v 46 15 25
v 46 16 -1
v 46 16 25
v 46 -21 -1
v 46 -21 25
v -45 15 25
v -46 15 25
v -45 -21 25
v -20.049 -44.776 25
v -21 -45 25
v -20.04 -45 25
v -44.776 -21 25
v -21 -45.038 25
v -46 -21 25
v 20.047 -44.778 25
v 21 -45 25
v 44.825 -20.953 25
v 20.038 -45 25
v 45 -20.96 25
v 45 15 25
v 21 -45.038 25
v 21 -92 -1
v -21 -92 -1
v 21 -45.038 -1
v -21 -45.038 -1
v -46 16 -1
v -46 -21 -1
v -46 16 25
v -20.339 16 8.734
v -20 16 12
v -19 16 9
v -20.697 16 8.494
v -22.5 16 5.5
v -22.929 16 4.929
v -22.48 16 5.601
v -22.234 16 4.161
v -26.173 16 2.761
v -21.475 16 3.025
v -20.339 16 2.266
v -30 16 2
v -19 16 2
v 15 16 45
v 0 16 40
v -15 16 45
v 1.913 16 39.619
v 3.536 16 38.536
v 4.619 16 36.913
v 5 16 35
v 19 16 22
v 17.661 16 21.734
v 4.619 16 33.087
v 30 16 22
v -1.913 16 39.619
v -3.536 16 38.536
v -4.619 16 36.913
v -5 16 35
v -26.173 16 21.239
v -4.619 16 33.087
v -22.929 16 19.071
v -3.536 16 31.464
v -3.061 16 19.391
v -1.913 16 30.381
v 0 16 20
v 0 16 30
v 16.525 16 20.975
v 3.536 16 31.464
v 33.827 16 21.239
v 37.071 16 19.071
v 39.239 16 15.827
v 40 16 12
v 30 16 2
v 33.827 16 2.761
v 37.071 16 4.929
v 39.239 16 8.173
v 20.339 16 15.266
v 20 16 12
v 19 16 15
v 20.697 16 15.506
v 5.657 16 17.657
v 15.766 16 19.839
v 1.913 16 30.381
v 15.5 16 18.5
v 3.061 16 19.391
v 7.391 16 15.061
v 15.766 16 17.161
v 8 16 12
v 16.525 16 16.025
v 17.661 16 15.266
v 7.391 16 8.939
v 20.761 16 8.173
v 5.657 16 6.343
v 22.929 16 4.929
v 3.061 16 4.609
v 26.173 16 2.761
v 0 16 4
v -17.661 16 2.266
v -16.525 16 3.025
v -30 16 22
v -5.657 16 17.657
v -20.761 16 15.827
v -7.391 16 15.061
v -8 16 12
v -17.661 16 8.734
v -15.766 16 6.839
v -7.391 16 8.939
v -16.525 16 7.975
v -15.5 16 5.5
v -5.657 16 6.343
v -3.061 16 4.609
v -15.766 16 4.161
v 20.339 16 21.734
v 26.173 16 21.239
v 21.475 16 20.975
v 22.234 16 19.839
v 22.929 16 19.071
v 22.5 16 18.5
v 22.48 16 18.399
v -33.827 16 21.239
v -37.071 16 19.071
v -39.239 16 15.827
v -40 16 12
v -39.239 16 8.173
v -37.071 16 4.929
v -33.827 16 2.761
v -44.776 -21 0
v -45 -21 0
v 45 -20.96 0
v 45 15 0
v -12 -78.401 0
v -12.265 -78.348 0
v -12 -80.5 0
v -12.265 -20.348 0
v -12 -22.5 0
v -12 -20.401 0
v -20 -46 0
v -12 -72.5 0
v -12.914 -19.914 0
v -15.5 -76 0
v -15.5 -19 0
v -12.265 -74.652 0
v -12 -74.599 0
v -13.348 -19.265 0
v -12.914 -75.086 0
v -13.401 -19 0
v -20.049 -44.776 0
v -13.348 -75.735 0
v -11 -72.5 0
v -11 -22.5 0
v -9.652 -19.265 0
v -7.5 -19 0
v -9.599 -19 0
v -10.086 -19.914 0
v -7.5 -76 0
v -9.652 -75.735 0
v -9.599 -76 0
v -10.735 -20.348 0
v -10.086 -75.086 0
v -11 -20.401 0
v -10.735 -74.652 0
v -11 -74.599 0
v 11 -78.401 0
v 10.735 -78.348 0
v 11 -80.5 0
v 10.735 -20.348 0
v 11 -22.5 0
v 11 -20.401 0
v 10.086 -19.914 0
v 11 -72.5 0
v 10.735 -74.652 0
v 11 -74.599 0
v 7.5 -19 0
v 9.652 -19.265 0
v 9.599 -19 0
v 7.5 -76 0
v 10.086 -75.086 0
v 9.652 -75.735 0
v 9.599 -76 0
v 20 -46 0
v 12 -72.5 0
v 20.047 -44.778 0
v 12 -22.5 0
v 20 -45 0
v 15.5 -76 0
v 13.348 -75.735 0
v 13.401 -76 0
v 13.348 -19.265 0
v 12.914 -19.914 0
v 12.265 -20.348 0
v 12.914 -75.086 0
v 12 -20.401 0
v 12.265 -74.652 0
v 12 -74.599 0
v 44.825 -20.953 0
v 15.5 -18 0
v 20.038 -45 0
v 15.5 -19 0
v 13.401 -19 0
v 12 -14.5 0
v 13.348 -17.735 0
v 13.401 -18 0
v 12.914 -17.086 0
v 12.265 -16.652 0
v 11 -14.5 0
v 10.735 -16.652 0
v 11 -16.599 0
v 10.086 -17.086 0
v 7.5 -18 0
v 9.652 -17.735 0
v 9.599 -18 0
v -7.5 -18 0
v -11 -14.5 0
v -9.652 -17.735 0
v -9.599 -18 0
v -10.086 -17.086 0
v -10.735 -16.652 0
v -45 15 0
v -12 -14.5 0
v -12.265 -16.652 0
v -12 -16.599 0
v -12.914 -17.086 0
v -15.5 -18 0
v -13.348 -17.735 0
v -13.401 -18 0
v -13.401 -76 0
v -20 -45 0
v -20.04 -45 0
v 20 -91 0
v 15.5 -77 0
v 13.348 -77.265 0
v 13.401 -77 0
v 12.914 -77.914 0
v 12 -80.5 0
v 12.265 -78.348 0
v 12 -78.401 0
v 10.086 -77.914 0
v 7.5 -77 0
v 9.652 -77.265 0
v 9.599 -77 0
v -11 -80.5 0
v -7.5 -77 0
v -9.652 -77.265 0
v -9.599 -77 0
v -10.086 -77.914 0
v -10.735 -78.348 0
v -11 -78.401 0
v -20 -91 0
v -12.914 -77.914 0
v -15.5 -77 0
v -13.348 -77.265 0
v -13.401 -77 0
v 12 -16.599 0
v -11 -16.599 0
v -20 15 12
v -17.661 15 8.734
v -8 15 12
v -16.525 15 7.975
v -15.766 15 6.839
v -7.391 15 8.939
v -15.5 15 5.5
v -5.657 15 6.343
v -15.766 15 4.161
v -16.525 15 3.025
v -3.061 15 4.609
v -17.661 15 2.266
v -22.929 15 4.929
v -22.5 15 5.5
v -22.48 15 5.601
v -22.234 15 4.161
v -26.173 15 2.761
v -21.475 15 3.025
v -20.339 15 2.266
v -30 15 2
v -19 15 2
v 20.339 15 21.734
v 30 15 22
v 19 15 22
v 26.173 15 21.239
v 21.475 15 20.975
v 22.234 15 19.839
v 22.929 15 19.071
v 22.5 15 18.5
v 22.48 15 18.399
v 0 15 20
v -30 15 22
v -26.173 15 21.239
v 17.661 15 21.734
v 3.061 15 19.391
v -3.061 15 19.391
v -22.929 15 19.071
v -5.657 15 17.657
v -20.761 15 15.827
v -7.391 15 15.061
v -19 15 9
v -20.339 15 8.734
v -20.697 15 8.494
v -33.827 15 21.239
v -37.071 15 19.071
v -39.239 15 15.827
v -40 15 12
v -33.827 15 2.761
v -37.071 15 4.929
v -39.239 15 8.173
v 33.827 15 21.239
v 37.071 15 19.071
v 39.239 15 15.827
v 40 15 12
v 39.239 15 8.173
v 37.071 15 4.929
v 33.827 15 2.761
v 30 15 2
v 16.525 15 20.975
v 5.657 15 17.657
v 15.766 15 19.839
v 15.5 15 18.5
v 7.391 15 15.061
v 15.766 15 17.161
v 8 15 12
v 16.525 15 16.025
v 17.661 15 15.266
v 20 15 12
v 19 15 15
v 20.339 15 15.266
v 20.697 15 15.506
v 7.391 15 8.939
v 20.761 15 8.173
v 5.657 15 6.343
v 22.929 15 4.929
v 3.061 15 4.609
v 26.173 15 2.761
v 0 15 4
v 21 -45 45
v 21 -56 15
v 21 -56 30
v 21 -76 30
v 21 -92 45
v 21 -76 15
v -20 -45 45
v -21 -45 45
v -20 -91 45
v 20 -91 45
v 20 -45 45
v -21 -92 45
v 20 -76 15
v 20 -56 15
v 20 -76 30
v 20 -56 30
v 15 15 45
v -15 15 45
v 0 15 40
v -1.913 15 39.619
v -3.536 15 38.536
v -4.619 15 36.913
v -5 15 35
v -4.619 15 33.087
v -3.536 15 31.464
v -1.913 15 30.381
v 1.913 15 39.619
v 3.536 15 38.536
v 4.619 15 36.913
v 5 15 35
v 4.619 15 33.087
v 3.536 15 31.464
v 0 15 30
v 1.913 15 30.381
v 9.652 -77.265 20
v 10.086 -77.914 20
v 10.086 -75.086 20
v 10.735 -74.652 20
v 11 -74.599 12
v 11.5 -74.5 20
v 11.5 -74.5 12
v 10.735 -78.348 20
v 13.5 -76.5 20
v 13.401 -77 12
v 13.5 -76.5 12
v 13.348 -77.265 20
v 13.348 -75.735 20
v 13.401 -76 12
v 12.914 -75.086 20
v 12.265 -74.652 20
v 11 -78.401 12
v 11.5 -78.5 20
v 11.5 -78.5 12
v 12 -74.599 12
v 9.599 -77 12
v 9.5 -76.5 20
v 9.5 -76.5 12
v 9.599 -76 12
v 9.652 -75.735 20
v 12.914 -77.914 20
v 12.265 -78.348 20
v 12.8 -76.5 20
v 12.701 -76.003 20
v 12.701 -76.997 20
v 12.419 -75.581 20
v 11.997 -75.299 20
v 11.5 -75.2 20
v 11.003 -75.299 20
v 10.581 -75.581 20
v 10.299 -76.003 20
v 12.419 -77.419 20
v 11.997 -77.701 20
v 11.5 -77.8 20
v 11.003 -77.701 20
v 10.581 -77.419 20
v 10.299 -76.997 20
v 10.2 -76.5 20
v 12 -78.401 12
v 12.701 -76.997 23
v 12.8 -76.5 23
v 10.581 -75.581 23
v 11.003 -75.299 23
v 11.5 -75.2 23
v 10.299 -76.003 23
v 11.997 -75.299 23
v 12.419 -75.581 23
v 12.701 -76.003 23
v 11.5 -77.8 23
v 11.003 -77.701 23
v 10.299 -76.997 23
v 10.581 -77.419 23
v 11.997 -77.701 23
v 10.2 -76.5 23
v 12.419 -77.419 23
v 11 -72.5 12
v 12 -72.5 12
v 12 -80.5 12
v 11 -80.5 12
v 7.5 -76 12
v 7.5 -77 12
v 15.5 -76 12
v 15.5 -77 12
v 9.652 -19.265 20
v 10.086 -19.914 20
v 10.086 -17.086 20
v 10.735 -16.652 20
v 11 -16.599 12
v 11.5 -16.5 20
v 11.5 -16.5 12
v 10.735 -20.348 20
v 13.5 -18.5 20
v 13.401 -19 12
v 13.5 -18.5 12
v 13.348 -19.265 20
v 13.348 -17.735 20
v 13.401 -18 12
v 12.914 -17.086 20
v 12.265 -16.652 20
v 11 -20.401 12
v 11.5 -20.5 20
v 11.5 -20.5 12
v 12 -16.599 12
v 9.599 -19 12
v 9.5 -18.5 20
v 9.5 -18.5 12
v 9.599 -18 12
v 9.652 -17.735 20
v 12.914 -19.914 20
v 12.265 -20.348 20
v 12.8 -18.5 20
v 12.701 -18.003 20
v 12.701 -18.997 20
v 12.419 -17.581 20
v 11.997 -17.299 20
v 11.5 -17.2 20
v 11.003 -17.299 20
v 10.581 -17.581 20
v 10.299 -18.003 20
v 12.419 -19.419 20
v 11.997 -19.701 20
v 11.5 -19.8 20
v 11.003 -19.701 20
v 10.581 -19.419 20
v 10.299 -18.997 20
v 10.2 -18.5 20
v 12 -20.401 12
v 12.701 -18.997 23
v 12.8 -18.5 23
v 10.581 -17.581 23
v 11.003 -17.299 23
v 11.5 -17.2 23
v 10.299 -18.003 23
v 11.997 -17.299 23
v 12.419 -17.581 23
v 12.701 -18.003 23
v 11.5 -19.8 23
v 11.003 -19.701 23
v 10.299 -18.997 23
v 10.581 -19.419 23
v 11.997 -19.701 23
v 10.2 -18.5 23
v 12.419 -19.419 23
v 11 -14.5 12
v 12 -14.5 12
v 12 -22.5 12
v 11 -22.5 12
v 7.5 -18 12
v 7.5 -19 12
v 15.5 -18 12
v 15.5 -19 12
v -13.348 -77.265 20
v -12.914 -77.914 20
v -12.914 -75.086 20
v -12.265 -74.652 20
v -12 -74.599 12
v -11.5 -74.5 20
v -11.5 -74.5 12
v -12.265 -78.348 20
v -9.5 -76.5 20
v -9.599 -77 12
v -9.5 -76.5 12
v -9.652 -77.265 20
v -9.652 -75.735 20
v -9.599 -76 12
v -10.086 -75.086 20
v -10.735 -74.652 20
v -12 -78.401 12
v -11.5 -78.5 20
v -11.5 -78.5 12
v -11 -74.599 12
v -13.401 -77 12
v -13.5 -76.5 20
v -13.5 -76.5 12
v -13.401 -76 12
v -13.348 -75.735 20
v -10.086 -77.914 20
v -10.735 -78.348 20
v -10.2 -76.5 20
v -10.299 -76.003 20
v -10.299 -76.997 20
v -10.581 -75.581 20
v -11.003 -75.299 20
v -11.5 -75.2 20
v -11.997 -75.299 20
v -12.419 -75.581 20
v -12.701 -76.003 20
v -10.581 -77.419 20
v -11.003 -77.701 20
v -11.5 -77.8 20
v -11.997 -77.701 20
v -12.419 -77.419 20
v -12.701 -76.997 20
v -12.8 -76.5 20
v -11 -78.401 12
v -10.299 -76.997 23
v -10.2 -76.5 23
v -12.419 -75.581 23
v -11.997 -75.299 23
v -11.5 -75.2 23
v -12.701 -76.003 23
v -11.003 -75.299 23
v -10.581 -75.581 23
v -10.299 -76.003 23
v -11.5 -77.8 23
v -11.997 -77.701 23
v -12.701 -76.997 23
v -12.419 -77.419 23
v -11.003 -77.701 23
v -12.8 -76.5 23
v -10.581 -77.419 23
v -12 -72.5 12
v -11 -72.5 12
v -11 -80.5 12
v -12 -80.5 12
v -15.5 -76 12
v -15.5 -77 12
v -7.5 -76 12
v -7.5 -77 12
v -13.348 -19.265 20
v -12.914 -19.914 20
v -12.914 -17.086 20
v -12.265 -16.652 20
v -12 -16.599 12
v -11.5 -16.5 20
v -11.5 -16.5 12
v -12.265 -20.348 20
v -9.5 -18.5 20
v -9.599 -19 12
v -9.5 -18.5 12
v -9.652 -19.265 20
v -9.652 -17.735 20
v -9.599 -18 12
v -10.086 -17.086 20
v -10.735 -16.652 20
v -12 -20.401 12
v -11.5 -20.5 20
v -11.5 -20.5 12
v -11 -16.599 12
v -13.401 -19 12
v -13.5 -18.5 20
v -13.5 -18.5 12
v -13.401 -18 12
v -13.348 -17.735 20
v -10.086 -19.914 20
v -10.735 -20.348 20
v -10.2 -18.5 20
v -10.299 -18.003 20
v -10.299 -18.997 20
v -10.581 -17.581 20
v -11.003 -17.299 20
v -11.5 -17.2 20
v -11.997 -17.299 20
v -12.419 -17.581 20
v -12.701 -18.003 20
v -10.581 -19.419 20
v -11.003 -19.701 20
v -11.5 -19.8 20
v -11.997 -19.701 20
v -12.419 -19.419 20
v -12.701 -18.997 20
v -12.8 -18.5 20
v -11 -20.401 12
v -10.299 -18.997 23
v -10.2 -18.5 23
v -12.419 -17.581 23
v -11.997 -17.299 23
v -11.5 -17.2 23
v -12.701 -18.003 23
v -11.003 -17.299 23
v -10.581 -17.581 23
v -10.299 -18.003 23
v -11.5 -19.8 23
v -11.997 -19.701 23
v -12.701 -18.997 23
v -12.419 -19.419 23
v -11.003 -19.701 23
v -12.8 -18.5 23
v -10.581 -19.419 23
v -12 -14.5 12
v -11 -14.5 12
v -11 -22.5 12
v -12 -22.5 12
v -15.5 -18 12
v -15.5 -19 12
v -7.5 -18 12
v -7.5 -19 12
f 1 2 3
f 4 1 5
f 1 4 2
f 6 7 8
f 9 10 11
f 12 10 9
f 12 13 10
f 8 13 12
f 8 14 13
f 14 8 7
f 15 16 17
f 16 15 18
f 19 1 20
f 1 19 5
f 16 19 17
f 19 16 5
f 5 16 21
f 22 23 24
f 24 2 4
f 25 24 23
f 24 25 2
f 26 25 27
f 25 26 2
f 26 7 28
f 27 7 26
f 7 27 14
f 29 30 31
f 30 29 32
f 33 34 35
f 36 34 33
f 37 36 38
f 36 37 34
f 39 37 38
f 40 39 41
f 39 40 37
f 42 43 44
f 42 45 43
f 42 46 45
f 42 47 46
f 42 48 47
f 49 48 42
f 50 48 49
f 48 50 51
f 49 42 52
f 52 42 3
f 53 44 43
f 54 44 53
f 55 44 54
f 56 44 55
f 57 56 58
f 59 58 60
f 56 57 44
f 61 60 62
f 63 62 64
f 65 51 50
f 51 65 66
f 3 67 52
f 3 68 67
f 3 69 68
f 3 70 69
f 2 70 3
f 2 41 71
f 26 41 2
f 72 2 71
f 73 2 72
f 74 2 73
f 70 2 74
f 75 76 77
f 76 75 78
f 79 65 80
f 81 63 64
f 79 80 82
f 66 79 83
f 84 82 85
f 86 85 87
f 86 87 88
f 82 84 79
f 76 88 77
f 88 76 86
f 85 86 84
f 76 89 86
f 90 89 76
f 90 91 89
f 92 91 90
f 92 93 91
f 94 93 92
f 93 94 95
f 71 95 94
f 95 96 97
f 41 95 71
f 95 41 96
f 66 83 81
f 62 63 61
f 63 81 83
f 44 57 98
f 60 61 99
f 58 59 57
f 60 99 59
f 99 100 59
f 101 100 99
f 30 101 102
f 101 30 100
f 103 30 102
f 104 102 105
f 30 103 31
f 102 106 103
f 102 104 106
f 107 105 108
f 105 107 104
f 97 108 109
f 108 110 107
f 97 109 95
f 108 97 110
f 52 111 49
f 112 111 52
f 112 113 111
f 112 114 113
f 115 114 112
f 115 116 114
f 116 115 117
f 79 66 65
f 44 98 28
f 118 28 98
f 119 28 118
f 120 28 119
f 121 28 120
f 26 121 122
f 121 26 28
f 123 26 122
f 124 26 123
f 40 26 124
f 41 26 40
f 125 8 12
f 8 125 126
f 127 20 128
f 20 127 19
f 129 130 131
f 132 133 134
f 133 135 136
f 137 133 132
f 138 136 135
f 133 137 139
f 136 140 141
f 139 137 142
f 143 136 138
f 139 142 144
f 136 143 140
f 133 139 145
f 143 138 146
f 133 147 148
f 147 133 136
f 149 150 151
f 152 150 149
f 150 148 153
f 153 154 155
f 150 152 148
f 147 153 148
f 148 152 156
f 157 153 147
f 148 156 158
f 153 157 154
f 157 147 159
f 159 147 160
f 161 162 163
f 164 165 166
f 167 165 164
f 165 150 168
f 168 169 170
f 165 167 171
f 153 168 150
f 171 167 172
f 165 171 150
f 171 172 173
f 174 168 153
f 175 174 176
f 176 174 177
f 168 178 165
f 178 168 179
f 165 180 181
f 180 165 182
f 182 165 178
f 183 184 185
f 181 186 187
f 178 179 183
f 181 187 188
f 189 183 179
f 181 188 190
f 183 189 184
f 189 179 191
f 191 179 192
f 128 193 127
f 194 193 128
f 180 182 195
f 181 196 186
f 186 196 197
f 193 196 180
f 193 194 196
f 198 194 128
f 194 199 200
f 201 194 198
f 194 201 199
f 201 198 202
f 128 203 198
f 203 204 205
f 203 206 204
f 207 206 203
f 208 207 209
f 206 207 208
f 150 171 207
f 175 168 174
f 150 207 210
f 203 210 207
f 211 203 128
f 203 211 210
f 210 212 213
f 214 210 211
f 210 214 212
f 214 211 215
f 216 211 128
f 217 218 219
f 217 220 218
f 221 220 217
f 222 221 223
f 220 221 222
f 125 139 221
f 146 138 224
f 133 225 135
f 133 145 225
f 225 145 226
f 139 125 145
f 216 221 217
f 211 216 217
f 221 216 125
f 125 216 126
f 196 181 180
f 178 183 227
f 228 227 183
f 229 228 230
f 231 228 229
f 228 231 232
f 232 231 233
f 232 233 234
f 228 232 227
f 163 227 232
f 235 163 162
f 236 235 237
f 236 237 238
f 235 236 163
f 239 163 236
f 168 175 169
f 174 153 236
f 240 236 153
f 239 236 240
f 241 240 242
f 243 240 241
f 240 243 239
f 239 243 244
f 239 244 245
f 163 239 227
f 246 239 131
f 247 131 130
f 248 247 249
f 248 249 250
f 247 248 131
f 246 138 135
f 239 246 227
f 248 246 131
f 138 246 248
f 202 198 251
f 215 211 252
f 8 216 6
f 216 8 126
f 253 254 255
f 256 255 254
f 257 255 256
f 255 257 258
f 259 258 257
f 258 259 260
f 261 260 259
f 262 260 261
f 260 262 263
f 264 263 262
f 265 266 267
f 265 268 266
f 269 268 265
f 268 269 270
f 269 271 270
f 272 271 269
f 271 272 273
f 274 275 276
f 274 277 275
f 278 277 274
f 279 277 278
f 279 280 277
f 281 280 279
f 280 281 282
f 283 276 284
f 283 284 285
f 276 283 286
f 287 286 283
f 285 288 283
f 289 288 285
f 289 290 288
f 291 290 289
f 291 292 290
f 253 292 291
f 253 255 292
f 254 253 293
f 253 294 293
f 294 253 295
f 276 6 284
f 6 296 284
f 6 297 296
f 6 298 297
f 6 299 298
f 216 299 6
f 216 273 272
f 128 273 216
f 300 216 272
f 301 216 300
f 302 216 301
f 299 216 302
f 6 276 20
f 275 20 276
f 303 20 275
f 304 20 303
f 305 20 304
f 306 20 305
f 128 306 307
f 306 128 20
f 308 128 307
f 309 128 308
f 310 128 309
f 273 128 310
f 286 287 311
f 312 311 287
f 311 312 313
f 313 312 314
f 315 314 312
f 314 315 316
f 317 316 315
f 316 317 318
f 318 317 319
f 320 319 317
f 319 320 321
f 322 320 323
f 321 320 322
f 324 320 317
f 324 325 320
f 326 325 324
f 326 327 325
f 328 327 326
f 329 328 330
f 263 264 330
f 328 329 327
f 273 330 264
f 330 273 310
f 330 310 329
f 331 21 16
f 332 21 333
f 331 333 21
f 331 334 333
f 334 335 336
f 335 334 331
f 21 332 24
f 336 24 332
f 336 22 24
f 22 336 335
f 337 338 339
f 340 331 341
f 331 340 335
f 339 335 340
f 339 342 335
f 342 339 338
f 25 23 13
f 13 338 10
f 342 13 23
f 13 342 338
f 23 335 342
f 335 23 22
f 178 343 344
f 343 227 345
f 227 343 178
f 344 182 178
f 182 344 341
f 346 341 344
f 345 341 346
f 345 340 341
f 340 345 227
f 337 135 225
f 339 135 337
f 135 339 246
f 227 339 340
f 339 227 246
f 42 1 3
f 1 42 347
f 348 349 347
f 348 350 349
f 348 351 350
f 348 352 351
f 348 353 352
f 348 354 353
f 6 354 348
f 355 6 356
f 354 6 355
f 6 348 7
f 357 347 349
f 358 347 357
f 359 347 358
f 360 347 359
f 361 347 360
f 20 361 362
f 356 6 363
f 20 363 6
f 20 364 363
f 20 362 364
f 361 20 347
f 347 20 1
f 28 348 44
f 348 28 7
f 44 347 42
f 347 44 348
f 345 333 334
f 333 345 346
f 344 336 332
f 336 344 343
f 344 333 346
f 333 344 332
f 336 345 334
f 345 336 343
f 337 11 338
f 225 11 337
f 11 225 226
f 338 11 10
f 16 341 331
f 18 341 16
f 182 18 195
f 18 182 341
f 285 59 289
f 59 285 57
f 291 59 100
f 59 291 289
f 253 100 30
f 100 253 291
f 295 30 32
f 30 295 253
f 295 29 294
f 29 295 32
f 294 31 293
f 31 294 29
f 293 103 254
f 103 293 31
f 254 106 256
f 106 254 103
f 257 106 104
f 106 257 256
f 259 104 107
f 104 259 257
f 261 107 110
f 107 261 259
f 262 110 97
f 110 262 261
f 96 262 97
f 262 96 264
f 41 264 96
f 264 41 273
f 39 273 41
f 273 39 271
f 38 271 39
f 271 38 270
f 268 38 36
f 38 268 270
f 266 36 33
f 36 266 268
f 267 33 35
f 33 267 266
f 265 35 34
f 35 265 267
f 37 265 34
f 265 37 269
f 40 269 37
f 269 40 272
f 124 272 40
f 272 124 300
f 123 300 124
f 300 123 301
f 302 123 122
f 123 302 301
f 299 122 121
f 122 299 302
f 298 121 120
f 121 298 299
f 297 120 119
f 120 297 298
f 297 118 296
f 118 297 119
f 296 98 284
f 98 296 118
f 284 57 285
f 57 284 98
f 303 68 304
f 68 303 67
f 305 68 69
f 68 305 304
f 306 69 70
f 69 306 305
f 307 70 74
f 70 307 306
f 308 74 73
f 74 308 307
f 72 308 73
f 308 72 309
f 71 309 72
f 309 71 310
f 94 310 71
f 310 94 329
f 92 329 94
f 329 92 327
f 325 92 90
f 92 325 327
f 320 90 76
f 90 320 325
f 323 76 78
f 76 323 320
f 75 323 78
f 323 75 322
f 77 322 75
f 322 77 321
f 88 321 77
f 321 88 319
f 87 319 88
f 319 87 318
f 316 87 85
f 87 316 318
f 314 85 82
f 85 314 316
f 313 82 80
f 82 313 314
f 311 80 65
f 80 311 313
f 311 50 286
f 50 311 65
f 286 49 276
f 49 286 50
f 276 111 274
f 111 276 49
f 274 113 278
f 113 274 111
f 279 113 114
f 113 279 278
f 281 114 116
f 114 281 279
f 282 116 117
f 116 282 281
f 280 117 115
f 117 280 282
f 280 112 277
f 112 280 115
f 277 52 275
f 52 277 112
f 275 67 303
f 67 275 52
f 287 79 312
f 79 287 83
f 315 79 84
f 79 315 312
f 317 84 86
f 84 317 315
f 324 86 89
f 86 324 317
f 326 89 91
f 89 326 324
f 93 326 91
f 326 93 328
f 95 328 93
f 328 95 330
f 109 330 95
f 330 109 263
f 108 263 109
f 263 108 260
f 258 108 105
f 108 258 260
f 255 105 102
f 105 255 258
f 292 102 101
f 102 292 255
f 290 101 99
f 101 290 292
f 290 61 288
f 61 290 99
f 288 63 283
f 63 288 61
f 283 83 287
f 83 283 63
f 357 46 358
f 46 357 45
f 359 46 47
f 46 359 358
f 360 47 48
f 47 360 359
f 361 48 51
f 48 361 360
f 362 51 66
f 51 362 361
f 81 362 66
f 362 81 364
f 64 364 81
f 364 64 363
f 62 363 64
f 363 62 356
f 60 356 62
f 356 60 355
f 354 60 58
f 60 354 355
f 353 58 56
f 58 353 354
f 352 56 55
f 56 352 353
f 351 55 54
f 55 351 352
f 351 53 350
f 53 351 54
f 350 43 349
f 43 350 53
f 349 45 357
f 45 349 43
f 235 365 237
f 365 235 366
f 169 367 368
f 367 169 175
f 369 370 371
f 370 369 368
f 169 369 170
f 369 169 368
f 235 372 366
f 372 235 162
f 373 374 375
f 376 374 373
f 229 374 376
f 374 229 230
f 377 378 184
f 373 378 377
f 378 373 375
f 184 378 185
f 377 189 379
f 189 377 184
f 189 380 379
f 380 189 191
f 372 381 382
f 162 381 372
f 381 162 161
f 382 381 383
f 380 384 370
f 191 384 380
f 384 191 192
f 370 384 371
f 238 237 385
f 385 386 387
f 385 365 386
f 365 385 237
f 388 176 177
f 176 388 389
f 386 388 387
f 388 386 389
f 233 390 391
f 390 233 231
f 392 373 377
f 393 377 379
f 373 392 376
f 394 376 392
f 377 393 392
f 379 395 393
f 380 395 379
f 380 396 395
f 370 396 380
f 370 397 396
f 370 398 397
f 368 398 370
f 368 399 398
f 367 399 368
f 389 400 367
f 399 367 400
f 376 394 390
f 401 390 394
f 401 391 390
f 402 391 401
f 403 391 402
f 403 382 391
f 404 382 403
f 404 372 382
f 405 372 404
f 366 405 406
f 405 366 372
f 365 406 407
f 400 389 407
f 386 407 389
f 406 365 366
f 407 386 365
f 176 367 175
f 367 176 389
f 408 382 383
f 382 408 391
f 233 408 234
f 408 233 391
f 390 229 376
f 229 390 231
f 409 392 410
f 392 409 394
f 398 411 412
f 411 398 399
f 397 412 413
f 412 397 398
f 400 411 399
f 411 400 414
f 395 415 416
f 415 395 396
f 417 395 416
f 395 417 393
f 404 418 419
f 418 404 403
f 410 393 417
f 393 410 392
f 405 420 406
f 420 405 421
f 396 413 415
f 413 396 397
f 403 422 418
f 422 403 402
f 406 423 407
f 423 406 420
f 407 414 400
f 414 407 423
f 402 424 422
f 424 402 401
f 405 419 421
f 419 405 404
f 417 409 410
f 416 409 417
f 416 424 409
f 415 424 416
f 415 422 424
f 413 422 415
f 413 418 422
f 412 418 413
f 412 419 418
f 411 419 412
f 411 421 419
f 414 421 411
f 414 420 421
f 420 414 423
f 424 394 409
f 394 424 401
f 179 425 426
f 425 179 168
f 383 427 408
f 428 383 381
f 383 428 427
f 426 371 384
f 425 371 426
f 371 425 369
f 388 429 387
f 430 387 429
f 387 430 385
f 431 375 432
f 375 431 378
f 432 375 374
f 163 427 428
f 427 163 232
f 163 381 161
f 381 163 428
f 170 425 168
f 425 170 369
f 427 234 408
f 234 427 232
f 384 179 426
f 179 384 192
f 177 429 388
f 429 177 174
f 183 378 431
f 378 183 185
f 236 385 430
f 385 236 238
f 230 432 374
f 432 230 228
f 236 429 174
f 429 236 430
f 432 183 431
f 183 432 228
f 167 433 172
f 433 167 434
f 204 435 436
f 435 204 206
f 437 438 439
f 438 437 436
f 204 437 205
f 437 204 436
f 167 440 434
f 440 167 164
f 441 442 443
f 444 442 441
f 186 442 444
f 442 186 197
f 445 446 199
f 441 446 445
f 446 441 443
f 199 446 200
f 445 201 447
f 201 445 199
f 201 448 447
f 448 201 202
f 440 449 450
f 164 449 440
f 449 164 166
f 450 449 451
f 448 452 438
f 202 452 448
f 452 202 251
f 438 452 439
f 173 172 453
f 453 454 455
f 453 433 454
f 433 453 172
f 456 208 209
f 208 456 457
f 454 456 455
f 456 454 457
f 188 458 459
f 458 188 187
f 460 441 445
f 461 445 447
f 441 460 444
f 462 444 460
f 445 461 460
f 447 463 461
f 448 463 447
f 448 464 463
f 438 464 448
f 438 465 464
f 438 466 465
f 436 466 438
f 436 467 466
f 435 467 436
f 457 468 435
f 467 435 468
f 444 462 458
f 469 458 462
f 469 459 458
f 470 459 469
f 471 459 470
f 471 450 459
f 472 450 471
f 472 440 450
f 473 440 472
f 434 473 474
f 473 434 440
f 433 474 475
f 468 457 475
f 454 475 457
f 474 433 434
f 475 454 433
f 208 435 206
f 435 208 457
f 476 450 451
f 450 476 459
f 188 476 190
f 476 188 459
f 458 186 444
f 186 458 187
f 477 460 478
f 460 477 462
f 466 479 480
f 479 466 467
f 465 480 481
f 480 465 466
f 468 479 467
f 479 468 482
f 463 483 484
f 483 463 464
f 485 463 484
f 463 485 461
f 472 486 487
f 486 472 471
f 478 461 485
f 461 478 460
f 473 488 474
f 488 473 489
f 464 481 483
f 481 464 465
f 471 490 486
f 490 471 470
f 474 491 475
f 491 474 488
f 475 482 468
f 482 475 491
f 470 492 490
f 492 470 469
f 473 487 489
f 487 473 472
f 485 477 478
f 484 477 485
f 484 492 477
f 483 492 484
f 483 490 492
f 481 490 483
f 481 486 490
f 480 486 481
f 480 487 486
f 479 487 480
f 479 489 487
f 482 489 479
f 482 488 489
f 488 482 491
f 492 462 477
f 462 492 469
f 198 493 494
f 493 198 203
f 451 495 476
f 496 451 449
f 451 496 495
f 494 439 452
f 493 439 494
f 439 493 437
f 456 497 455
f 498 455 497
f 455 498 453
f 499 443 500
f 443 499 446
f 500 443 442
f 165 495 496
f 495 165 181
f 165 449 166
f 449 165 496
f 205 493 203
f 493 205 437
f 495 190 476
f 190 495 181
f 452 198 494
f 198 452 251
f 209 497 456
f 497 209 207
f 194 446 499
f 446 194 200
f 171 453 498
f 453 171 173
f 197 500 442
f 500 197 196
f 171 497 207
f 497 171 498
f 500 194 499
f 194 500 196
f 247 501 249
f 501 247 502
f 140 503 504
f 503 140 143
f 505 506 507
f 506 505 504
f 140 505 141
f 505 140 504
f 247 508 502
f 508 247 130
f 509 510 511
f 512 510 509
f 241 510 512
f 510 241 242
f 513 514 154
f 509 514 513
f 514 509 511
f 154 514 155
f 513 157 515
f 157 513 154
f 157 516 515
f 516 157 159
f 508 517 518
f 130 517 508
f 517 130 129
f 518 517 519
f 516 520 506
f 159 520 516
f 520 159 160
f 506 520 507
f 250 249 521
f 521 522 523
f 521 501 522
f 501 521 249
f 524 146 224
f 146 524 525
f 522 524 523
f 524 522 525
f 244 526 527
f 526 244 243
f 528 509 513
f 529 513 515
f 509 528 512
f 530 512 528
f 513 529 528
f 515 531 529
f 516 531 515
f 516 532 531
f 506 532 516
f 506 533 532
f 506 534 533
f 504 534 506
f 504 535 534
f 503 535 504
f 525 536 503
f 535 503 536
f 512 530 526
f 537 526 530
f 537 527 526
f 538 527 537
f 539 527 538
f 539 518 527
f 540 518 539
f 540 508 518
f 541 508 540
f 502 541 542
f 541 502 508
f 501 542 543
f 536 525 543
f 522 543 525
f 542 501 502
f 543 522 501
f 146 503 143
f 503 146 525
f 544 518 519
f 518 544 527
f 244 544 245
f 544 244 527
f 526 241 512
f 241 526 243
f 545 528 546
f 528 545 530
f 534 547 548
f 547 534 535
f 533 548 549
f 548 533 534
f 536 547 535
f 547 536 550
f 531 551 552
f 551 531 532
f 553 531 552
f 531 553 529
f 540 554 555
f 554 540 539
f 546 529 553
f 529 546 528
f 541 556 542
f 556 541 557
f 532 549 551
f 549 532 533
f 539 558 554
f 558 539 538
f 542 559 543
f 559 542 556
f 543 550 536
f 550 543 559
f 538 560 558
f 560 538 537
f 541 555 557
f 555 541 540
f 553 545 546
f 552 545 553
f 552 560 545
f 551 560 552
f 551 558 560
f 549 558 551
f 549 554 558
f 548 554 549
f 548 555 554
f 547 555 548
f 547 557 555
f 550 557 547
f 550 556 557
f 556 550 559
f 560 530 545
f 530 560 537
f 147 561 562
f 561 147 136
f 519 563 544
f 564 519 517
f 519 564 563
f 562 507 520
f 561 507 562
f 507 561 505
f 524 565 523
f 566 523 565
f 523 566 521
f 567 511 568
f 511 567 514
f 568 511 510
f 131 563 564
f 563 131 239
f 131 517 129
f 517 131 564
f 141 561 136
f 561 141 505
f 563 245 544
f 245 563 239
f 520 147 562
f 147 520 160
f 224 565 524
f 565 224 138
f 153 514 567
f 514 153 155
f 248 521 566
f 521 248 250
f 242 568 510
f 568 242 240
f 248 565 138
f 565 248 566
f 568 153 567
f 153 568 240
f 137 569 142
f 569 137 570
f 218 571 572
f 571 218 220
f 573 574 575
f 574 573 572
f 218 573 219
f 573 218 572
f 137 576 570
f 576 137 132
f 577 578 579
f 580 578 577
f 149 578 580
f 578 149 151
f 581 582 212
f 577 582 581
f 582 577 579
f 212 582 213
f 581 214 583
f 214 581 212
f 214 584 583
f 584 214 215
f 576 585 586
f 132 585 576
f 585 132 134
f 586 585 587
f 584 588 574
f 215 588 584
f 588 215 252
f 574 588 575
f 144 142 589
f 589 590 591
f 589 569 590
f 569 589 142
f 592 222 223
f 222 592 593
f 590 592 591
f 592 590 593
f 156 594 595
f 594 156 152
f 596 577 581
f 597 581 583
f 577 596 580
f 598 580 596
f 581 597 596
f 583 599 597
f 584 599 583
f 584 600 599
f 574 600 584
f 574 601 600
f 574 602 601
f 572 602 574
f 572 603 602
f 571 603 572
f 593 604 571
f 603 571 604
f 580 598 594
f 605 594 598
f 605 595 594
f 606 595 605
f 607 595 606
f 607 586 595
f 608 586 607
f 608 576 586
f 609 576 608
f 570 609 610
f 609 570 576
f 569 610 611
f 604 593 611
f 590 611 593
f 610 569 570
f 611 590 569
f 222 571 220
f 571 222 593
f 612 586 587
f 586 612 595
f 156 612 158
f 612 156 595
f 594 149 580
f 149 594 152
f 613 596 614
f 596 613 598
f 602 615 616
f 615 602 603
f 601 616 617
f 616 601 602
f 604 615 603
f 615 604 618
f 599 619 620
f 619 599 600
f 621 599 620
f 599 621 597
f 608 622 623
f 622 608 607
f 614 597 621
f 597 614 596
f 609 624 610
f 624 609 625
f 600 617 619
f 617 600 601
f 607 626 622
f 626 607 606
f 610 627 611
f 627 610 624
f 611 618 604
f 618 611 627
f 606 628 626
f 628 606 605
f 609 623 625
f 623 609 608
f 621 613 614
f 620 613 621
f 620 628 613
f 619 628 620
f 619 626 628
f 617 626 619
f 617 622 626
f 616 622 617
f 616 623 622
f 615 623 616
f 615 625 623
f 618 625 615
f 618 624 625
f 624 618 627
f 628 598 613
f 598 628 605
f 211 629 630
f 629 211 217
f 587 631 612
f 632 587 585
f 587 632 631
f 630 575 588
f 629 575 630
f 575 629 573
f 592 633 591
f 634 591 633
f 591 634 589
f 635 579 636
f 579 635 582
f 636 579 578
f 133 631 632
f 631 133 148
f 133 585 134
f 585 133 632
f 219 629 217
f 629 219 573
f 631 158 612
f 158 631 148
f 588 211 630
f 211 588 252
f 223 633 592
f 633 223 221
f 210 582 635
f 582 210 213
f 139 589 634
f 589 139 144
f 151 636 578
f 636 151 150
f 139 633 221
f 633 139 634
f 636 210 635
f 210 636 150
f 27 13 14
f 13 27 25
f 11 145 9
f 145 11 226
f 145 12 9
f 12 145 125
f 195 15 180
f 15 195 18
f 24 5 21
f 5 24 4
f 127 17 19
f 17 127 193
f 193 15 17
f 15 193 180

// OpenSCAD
// file: pico.scad
use <generic.scad>;

module picoStuds()
{
    union() {
        translate([4.8, 2, 0]) stud(1, 5);
        translate([16.2, 2, 0]) stud(1, 5);
        translate([4.8, 49, 0]) stud(1, 5);
        translate([16.2, 49, 0]) stud(1, 5);
    }
}

module picoStudHoles(h)
{    
    union() {
        translate([4.8, 2, 0]) studHole(1.2, h);
        translate([16.2, 2, 0])studHole(1.2, h);
        translate([4.8, 49, 0]) studHole(1.2, h);
        translate([16.2, 49, 0]) studHole(1.2, h);
    }
}

module piZeroStuds(h)
{
    union() {
        translate([3.5, 3.5, 0]) stud(1.3, h);
        translate([61.5, 3.5, 0]) stud(1.3, h);
        translate([3.5, 26.5, 0]) stud(1.3, h);
        translate([61.5, 26.5, 0]) stud(1.3, h);
    }
}
// file: generic.scad
module myBox(w,d,h) 
{
    translate([-1,-1,-1])
    difference() {
        cube([w+2, d+2, h+1]);
        translate([1, 1, 1])
            cube([w, d, h]);
    }
}

module stud(radius, h)
{    
    union() {
        cylinder(h, radius + 0.7, radius+0.7);
        translate([0,0, h])
        cylinder(3, radius, radius);
        translate ([-4, -0.5, 0]) cube([8, 1, h - 8]);
        translate ([-0.5, -4, 0]) cube([1, 8, h - 8]);
    }
}

module studHole(radius, h)
{    
    difference() {
        cylinder(h, radius + 1, radius+1);
        translate([0,0,h-2])
        cylinder(2, radius, radius);
    }    
}
// main file
$fn=16;

use <generic.scad>;
use <pico.scad>;

module noir_cam() 
{

    circle(r= 8);

    translate([-30,0]) 
        circle(r = 10);
    
    translate([-19, 6.5])
        circle(r= 3.5);

    translate([30,0]) 
        circle(r=10);
    
    translate([19, -6.5])
        circle(r= 3.5);
}

module thermal_cam()
{
    circle(r=5);
}

difference() {
    color([1,0.5,0.5]) 
        union() {
            translate([-45,-20,0]) myBox(90,35,25);
            translate([-46,16,25]) rotate([90,0,0]) linear_extrude(1) polygon([[0,0], [31,20], [61,20], [92,0]]);
            translate([-20, -91, 0]) myBox(40,70,45);
            
        }
    
    translate([10, -76, 15]) cube([20,20,15]);
    translate([-45, -45, 0]) cube([90,50,57]);
    rotate([270,0,0])
        linear_extrude(20) 
            union() {
                translate([0,-12, -20])        
                    noir_cam();    
                translate([0, -35])            
                    thermal_cam();
        };
    
    
}

translate([15, -80,0]) rotate([0,0,90]) piZeroStuds(20);

difference() {
    translate([0,0,-1]) linear_extrude(26) polygon([[-21,-21],[-20,-46],[-46,-21]]);
    translate([0.6,0.6,0]) linear_extrude(26) polygon([[-21,-21],[-20,-46],[-46,-21]]);
}

difference() {
    translate([0,0,-1]) linear_extrude(26) polygon([[21,-20],[20,-46],[46,-21]]);
    translate([-0.6,0.6,0]) linear_extrude(26) polygon([[21,-20],[20,-46],[46,-21]]);
}
